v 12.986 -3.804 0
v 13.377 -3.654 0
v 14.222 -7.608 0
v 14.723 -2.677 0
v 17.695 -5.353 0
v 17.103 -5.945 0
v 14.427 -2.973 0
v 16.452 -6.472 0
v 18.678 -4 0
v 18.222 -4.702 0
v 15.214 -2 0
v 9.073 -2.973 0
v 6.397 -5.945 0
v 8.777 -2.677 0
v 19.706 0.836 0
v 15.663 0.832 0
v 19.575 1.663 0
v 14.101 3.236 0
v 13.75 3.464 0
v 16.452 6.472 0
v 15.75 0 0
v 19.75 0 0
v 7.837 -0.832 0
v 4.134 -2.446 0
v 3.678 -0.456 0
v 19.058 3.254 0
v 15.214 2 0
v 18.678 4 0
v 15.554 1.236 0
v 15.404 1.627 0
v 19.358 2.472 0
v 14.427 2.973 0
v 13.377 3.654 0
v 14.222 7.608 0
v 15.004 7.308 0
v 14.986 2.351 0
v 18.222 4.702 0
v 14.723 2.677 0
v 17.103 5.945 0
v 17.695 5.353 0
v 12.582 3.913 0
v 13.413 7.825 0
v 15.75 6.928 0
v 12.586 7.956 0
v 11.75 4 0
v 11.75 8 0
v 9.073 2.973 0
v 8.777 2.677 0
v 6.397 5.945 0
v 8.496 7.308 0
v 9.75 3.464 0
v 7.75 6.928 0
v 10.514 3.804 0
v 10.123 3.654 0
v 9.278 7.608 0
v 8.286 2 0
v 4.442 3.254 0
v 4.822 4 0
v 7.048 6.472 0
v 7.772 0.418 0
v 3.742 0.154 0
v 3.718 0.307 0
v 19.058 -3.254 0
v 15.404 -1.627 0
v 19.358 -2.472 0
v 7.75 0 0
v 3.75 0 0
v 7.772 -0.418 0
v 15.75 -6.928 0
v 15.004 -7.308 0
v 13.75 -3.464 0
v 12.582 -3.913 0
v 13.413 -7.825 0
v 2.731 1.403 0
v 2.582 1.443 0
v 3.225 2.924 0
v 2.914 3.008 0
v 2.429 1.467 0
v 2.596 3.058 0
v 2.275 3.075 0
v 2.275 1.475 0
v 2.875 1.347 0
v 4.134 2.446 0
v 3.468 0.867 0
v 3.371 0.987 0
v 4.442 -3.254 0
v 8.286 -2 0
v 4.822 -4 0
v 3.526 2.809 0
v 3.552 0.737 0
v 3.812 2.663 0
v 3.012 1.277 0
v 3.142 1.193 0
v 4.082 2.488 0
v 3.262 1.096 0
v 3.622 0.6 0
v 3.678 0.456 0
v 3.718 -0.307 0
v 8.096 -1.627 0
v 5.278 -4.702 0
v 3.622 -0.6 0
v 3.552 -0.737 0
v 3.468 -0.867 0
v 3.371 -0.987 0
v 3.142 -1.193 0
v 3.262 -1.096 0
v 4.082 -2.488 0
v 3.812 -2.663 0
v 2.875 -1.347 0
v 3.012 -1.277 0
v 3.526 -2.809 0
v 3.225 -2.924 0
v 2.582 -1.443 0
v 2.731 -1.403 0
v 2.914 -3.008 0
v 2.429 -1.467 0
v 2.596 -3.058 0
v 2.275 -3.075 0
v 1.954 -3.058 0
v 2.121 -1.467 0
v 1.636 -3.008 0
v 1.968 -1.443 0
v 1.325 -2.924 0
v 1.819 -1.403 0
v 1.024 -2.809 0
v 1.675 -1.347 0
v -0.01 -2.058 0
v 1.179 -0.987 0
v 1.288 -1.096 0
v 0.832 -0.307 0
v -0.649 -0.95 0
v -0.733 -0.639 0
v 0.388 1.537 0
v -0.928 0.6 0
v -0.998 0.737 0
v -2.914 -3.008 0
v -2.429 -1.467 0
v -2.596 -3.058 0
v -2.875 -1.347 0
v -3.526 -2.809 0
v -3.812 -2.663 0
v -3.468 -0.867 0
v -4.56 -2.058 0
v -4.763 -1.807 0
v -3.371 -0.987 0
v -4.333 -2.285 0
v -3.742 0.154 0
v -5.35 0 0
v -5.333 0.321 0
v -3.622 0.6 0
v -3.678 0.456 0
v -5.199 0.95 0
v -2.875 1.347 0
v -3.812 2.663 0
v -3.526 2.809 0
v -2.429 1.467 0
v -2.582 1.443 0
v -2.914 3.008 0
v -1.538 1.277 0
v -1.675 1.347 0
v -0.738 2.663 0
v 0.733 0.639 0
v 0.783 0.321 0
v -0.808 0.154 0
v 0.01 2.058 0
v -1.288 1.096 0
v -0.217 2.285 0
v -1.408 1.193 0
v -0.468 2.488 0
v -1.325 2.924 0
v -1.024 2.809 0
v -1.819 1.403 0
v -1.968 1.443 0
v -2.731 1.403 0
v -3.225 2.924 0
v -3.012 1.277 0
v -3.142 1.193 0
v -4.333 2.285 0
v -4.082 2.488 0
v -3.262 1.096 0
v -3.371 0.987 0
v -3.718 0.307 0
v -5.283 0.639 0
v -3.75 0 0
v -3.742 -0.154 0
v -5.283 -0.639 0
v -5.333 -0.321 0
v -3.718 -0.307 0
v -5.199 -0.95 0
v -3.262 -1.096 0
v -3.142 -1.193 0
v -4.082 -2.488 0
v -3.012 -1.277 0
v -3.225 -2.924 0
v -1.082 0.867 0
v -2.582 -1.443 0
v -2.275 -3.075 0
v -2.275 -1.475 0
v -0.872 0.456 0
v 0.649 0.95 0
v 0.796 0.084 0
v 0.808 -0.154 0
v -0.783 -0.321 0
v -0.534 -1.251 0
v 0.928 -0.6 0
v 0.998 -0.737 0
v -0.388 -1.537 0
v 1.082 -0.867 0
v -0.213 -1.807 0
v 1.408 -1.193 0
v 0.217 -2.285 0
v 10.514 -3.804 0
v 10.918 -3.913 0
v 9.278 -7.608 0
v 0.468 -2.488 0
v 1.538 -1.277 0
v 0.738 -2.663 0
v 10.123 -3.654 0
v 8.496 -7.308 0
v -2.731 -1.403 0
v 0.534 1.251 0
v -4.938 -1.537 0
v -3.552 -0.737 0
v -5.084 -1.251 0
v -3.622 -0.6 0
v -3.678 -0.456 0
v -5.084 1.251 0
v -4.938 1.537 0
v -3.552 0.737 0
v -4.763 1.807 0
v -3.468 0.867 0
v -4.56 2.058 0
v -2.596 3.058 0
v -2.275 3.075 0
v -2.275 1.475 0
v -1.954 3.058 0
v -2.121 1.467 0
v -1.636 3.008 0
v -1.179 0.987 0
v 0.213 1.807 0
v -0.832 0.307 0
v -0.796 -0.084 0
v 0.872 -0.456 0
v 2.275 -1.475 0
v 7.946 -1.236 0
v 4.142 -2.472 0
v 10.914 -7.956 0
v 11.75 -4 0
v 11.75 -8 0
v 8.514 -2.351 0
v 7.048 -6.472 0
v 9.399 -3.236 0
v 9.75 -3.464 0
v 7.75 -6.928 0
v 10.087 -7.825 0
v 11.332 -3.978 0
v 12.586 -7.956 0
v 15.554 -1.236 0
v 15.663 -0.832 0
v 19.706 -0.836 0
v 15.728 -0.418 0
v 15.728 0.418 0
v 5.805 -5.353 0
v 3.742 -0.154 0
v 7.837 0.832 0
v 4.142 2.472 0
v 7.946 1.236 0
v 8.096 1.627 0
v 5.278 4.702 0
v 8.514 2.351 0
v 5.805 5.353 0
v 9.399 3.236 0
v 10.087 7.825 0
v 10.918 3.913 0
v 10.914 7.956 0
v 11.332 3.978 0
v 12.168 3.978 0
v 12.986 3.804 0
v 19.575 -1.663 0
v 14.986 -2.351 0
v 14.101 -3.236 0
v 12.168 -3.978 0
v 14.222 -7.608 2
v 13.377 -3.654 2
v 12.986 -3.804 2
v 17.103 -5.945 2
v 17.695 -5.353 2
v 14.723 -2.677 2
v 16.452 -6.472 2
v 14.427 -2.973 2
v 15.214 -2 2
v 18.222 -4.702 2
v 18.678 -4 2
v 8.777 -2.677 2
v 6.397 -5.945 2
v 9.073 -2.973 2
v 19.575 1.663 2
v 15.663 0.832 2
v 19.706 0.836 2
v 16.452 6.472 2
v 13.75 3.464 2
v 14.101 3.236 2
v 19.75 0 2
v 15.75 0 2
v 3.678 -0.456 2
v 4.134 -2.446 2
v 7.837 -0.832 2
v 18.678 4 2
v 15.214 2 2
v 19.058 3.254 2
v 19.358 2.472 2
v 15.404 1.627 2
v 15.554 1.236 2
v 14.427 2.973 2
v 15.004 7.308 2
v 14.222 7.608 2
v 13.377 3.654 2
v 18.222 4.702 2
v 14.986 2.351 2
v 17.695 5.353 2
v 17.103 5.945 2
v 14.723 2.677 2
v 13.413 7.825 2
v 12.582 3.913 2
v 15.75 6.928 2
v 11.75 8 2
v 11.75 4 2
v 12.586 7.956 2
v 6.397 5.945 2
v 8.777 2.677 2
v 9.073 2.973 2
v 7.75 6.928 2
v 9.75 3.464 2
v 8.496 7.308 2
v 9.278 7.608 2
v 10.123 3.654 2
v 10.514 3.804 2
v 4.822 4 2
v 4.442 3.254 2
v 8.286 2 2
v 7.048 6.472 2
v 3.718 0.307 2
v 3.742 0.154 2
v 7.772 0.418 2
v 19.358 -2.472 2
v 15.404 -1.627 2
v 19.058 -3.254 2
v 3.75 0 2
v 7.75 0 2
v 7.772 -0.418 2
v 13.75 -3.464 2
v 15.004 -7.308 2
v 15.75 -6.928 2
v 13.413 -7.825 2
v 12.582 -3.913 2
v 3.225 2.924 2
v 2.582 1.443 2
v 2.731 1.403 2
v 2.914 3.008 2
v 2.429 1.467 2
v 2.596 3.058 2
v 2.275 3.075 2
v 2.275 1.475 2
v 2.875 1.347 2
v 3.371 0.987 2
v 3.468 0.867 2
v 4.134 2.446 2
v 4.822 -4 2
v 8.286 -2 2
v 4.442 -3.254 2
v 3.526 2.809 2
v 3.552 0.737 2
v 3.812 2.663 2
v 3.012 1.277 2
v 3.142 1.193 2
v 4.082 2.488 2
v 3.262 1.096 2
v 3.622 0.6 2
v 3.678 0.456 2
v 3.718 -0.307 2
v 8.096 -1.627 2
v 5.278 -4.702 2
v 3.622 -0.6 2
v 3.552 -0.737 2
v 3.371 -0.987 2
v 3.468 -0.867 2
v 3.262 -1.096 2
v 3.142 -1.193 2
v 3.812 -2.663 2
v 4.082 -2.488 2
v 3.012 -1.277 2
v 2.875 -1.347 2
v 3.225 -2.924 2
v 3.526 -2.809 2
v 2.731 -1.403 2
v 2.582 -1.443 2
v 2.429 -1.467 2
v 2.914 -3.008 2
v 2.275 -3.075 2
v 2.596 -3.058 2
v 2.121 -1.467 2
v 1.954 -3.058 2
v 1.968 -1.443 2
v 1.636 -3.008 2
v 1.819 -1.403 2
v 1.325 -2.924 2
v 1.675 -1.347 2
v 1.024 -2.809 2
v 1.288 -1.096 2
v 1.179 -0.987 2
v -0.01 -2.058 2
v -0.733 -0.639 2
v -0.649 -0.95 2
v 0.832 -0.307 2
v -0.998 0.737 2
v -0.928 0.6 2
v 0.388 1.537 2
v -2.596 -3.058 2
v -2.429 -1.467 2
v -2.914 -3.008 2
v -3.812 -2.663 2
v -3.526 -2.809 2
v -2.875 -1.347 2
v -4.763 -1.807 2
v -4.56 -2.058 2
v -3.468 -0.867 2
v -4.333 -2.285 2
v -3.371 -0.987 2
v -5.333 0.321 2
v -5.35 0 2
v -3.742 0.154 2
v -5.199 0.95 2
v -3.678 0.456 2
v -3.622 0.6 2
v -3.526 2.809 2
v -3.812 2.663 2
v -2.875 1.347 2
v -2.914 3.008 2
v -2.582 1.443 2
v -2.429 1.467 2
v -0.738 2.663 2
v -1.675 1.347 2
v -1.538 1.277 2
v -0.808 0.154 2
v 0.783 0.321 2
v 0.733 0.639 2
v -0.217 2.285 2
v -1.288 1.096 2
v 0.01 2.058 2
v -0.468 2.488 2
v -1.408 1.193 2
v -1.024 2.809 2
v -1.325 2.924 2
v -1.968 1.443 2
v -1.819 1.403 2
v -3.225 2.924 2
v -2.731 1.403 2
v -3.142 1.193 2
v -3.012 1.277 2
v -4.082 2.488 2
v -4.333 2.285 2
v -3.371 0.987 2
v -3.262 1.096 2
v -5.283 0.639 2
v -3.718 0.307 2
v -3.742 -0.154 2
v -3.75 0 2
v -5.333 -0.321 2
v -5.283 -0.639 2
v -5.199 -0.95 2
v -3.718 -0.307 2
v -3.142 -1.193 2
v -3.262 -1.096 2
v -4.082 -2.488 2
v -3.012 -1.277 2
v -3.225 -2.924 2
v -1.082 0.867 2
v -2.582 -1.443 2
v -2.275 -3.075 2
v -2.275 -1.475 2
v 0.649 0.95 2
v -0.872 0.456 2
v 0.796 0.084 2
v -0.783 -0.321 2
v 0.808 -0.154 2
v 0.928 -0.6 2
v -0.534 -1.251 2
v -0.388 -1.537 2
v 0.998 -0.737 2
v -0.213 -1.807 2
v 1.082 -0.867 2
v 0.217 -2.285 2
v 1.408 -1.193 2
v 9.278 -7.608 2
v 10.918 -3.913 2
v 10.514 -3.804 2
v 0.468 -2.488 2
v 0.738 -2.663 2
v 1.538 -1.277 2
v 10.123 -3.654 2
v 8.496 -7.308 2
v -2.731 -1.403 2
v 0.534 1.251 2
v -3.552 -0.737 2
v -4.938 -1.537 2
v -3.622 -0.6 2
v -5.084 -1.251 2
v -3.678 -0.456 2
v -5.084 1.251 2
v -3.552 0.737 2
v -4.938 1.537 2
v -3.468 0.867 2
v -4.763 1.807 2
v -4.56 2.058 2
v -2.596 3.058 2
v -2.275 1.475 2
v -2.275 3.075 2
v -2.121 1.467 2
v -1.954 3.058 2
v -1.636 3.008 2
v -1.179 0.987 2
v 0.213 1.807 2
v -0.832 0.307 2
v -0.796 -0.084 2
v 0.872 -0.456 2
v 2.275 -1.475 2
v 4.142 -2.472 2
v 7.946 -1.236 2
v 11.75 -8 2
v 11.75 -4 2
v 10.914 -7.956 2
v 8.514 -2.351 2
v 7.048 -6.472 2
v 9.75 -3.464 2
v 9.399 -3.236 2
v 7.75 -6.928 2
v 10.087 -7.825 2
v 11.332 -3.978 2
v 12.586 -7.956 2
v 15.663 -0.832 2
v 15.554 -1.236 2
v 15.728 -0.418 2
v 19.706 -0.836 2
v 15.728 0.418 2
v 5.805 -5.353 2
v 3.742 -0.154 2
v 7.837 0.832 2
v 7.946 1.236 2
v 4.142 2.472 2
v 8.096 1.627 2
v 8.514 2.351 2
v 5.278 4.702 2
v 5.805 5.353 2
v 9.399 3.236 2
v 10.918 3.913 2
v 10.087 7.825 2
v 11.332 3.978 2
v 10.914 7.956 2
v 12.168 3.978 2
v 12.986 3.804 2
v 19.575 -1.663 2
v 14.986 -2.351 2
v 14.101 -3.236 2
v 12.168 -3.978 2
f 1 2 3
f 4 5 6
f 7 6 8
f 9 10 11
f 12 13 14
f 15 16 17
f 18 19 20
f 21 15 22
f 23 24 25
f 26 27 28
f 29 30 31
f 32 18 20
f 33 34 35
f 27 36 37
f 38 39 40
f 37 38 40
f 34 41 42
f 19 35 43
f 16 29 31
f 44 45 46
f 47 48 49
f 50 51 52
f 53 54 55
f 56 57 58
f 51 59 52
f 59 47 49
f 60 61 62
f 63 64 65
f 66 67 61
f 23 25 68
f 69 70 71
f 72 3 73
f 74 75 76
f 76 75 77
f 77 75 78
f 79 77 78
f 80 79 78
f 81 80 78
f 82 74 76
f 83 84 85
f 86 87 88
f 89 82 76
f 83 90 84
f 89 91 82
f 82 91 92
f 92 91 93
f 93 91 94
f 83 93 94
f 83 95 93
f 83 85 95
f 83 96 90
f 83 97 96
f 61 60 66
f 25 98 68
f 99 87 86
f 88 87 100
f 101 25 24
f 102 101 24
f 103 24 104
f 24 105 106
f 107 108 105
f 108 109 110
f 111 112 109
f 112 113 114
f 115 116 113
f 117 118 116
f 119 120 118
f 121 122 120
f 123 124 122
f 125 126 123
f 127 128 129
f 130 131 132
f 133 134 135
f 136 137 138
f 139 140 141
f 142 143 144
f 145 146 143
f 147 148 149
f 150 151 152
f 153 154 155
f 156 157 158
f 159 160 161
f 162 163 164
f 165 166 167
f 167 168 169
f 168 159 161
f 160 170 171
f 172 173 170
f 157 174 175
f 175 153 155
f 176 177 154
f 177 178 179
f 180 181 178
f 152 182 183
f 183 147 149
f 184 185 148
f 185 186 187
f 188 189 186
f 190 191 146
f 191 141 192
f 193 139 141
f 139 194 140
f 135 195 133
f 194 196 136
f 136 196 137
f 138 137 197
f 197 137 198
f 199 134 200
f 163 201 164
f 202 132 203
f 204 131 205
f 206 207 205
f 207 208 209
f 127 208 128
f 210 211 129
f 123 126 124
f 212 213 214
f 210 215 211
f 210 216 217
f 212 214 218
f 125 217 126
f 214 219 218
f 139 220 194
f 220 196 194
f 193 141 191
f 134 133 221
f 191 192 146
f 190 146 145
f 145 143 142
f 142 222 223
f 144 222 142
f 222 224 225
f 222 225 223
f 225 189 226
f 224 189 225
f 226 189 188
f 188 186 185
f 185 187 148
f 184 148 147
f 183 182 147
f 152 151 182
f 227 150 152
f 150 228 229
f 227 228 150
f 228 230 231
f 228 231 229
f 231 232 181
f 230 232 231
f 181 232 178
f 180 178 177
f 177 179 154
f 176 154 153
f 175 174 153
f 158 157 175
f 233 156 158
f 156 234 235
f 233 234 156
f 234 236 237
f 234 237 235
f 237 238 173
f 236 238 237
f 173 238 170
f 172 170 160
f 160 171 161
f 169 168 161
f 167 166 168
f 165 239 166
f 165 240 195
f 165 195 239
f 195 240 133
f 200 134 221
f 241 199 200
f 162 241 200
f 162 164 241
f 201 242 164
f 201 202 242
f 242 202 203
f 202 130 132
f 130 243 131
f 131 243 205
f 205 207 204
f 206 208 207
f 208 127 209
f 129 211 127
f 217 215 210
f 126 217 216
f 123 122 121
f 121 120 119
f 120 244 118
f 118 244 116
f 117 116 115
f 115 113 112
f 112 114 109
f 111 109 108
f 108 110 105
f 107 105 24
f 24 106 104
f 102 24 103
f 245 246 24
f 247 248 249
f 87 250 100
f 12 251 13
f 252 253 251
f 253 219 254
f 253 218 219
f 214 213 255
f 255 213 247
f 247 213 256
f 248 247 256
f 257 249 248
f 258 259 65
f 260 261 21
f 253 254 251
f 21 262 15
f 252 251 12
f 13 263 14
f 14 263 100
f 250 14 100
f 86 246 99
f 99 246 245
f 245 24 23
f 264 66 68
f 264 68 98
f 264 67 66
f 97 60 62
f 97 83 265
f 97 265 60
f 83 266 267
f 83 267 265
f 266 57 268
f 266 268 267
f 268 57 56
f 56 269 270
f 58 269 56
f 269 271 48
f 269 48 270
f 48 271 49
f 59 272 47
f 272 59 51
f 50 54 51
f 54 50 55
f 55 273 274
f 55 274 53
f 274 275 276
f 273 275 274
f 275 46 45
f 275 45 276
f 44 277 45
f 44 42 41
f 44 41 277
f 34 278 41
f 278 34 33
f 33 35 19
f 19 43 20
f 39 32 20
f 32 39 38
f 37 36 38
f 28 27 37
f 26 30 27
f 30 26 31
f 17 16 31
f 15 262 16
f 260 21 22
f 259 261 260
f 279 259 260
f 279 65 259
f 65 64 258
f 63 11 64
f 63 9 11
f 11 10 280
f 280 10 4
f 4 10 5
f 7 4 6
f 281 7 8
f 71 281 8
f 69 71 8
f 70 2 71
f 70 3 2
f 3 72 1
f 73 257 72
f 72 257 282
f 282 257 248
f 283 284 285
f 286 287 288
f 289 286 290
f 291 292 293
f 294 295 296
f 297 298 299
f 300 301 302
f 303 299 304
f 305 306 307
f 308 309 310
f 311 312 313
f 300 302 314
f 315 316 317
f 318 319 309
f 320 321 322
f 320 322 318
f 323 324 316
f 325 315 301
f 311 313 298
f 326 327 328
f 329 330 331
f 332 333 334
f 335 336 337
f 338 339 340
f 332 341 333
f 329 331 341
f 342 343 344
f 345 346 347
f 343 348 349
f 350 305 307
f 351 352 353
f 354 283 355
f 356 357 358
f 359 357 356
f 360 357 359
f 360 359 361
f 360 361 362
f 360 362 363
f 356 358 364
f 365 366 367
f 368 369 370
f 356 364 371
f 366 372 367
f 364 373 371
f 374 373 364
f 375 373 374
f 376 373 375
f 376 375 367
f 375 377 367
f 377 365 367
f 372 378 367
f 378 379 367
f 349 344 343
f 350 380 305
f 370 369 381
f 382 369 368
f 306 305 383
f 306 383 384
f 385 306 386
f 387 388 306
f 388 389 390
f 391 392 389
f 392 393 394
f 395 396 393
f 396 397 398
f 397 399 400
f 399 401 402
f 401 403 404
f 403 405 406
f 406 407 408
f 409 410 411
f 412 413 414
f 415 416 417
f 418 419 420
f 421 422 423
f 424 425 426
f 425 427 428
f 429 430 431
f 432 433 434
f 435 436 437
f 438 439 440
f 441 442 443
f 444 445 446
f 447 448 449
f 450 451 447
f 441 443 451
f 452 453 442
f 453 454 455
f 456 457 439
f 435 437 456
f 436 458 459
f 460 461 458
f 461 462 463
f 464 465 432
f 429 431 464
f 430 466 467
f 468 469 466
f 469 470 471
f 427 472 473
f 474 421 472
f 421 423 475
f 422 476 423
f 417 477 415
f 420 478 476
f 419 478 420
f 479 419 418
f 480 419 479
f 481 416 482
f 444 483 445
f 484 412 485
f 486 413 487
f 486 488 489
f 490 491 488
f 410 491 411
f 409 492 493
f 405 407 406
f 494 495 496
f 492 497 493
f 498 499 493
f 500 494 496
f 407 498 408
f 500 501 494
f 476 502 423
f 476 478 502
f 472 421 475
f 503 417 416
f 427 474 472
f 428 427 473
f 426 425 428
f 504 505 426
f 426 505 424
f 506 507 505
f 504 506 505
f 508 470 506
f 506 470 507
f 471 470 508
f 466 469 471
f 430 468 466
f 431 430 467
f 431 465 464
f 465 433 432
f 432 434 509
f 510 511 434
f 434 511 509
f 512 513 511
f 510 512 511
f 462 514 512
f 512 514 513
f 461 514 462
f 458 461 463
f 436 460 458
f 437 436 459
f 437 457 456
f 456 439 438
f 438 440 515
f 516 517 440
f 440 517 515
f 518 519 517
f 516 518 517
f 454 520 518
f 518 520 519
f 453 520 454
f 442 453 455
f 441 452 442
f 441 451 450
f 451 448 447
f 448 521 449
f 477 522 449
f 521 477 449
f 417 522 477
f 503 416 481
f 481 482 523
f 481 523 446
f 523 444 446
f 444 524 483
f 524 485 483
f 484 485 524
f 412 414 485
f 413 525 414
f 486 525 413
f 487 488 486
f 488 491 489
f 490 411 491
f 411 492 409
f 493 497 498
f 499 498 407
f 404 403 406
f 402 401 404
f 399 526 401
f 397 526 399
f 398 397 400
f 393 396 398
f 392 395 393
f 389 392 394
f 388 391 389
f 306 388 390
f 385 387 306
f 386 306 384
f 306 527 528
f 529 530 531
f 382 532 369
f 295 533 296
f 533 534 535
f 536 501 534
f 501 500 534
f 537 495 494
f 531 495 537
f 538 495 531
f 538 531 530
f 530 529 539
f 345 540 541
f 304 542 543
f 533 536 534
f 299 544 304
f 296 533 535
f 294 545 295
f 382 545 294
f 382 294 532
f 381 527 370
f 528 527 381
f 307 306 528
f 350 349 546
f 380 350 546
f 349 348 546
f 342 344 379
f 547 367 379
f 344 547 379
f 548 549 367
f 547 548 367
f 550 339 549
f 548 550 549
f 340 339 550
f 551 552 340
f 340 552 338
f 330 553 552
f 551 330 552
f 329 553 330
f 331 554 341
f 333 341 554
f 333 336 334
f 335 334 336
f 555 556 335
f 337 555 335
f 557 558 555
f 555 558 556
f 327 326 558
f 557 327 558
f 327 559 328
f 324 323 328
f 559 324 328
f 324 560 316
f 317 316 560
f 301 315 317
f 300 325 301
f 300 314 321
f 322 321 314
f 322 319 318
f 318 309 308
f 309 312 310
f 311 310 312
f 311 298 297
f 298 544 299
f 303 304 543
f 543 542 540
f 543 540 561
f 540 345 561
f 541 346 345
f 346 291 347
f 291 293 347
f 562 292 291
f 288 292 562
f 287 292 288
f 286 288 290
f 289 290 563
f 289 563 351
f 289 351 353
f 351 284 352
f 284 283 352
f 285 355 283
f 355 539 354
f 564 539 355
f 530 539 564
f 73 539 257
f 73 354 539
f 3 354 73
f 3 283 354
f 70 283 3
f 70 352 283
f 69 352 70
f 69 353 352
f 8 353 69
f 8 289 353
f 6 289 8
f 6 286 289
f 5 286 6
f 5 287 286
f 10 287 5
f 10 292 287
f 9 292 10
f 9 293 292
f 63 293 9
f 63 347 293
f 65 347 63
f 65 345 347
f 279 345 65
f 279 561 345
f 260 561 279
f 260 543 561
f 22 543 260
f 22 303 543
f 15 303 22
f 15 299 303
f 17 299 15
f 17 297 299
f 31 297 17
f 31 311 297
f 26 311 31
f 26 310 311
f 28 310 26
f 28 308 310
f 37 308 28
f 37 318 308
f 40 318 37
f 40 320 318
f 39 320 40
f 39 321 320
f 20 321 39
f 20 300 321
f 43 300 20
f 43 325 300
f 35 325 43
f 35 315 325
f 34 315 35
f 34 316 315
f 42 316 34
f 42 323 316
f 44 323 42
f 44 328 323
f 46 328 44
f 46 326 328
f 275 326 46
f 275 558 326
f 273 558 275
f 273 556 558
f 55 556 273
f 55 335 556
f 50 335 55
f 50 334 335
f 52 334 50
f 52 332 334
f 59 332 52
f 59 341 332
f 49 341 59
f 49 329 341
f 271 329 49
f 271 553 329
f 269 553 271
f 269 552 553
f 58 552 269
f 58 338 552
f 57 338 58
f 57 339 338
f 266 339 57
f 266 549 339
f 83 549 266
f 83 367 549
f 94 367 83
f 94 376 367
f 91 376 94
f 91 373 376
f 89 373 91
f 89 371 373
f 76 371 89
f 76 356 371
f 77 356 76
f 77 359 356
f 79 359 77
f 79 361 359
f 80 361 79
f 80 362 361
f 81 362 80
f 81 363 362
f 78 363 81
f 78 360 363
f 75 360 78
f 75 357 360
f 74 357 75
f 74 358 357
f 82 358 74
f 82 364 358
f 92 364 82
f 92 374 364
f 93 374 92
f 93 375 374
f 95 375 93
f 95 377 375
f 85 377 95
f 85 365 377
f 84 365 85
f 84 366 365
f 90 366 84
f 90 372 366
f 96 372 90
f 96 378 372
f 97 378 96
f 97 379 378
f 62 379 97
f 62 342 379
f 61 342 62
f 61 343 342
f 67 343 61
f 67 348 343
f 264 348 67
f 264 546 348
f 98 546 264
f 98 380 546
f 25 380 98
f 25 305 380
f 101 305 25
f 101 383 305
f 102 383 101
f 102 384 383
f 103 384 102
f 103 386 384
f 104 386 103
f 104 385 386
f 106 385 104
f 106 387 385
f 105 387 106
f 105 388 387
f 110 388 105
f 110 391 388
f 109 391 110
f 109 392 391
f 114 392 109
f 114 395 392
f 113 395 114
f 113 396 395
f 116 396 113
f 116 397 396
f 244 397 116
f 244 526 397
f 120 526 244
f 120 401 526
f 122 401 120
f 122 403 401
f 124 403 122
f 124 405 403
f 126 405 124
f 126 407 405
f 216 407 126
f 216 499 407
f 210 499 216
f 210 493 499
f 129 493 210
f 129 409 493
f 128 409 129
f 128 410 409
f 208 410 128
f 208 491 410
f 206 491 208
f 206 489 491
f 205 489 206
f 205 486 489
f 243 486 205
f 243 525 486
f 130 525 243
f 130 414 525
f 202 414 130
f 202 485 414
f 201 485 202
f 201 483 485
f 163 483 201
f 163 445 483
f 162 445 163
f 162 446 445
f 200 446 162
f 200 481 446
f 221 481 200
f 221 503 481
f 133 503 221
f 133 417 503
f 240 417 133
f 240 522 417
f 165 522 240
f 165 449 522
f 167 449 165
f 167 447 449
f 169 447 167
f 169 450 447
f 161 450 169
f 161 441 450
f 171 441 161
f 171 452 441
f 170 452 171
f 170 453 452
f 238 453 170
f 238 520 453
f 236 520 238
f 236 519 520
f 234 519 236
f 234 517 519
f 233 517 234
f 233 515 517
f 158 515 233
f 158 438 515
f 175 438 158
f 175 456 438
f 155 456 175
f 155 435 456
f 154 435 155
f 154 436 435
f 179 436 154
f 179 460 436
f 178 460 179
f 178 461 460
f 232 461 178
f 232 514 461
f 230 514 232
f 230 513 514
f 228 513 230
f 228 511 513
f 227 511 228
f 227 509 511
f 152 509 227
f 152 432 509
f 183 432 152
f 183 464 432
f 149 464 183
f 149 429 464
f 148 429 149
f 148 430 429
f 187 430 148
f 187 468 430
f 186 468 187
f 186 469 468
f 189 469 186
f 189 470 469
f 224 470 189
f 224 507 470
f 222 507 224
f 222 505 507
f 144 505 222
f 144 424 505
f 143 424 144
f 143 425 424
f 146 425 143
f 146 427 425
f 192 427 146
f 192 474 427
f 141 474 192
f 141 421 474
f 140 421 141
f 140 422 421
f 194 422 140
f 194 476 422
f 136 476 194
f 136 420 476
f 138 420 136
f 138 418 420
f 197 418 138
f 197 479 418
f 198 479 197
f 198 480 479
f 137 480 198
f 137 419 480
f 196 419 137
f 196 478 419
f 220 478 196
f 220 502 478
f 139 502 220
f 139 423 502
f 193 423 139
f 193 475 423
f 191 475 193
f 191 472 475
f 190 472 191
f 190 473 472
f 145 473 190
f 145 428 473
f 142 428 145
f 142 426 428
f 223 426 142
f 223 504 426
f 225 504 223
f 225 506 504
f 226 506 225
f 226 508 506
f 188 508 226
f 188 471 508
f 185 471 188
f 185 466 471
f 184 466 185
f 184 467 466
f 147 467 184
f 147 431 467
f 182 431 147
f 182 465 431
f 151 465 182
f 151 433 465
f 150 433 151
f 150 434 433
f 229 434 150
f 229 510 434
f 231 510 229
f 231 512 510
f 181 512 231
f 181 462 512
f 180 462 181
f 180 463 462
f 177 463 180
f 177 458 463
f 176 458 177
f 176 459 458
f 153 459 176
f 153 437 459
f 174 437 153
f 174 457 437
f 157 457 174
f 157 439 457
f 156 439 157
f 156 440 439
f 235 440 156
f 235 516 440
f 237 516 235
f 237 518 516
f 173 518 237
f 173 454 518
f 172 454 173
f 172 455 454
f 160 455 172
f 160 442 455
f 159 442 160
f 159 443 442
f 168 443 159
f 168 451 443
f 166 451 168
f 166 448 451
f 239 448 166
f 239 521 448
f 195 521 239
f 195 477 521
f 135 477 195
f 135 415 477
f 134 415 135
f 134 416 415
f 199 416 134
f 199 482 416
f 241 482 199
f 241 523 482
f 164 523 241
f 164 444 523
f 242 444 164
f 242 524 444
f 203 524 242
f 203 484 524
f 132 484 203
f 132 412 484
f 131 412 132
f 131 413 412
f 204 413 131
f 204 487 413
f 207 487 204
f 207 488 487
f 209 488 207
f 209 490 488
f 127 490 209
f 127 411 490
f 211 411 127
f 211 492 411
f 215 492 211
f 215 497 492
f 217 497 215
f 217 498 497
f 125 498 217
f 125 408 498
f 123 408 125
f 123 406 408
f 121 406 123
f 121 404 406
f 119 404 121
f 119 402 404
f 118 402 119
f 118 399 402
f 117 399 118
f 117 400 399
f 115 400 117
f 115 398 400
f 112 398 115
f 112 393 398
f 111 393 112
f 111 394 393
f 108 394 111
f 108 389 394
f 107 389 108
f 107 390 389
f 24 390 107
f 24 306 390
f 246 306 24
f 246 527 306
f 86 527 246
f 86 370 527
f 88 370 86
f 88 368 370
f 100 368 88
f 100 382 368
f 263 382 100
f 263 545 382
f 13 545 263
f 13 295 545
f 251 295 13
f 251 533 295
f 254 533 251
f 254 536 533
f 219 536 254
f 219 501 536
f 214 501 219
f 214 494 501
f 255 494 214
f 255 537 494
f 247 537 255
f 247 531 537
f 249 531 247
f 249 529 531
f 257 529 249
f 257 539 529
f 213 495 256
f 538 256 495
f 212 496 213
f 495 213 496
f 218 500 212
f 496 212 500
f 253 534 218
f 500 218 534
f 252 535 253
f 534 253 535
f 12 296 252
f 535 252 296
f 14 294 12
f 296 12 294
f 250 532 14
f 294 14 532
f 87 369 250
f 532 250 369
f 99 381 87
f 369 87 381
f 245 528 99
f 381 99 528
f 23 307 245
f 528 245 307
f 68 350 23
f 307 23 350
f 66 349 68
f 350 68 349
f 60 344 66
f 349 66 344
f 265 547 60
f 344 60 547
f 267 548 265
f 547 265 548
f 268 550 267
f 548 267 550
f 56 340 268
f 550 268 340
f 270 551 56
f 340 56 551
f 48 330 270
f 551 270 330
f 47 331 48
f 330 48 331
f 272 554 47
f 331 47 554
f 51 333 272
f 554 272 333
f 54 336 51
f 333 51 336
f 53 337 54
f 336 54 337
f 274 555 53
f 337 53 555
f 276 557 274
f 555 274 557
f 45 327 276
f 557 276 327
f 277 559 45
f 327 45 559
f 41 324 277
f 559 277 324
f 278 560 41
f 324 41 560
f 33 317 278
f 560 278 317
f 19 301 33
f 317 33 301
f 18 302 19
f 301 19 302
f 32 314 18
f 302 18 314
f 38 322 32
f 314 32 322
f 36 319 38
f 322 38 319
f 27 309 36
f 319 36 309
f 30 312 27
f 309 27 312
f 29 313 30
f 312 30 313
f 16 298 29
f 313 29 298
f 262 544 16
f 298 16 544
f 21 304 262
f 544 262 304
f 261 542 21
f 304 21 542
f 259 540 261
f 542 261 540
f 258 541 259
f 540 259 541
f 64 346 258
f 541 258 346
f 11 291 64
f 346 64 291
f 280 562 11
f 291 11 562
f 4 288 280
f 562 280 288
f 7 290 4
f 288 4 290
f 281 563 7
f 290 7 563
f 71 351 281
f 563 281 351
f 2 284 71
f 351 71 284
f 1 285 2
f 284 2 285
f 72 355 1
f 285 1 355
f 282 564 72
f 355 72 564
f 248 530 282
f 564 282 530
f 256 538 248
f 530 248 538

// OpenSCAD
/* [Basic] */
// size of filament, ie 2.85 or 1.75
filament_diameter = 2.85; // [3.0, 2.85, 1.75]

// You want a handle. It is really handy
handle = 1; // [1:Enabled,0:Disabled] 

/* [Advanced] */
handle_diameter = 16; // [3:30]


// Width of band
thickness = 1.6 ; // 
//Height of the print
object_height = 2; // 
// unfortunatly holes get a bit tighter than you would expect so you might have to take this into account. Negative value if you want to clip to be tighter.
expansion = 0.1; 
// Other value than 180 to make the clip asymetrical. Try 160 for instance.
rotation_2nd_ring = 180; // [100:200]

/* [Hidden] */
// preview[view:east, tilt:top]

$fn = 60;

holedia = filament_diameter + expansion;


module handle(){
    union(){
        translate([handle_diameter/2,0]){
            difference(){
                circle(d = handle_diameter);
                circle(d =handle_diameter/2);
                }
            }
//       translate([-5,0]){
//        #square([10,holedia], center = true);
//        }
    }
    
}

module ring(rotation=0){
 rotate(rotation){
      translate([(holedia+thickness)*0.5,0]){
        union(){
            difference(){
                circle(d = (holedia + thickness*2));
                union(){
                    circle(d = holedia);
                    translate([-holedia-thickness*2,0]){
                        square([holedia+thickness*2,holedia+thickness*2]);
                    }
                }
            }
            translate([-(holedia+thickness)/2,0]){
                circle(d=thickness);
            }
        }
      }
 }
}



linear_extrude(height=object_height){
    union(){
        if(handle){
            translate([(holedia+thickness/2),0]){
                handle();
            }
        }
        ring(0);
        ring(rotation_2nd_ring);
    };
}
